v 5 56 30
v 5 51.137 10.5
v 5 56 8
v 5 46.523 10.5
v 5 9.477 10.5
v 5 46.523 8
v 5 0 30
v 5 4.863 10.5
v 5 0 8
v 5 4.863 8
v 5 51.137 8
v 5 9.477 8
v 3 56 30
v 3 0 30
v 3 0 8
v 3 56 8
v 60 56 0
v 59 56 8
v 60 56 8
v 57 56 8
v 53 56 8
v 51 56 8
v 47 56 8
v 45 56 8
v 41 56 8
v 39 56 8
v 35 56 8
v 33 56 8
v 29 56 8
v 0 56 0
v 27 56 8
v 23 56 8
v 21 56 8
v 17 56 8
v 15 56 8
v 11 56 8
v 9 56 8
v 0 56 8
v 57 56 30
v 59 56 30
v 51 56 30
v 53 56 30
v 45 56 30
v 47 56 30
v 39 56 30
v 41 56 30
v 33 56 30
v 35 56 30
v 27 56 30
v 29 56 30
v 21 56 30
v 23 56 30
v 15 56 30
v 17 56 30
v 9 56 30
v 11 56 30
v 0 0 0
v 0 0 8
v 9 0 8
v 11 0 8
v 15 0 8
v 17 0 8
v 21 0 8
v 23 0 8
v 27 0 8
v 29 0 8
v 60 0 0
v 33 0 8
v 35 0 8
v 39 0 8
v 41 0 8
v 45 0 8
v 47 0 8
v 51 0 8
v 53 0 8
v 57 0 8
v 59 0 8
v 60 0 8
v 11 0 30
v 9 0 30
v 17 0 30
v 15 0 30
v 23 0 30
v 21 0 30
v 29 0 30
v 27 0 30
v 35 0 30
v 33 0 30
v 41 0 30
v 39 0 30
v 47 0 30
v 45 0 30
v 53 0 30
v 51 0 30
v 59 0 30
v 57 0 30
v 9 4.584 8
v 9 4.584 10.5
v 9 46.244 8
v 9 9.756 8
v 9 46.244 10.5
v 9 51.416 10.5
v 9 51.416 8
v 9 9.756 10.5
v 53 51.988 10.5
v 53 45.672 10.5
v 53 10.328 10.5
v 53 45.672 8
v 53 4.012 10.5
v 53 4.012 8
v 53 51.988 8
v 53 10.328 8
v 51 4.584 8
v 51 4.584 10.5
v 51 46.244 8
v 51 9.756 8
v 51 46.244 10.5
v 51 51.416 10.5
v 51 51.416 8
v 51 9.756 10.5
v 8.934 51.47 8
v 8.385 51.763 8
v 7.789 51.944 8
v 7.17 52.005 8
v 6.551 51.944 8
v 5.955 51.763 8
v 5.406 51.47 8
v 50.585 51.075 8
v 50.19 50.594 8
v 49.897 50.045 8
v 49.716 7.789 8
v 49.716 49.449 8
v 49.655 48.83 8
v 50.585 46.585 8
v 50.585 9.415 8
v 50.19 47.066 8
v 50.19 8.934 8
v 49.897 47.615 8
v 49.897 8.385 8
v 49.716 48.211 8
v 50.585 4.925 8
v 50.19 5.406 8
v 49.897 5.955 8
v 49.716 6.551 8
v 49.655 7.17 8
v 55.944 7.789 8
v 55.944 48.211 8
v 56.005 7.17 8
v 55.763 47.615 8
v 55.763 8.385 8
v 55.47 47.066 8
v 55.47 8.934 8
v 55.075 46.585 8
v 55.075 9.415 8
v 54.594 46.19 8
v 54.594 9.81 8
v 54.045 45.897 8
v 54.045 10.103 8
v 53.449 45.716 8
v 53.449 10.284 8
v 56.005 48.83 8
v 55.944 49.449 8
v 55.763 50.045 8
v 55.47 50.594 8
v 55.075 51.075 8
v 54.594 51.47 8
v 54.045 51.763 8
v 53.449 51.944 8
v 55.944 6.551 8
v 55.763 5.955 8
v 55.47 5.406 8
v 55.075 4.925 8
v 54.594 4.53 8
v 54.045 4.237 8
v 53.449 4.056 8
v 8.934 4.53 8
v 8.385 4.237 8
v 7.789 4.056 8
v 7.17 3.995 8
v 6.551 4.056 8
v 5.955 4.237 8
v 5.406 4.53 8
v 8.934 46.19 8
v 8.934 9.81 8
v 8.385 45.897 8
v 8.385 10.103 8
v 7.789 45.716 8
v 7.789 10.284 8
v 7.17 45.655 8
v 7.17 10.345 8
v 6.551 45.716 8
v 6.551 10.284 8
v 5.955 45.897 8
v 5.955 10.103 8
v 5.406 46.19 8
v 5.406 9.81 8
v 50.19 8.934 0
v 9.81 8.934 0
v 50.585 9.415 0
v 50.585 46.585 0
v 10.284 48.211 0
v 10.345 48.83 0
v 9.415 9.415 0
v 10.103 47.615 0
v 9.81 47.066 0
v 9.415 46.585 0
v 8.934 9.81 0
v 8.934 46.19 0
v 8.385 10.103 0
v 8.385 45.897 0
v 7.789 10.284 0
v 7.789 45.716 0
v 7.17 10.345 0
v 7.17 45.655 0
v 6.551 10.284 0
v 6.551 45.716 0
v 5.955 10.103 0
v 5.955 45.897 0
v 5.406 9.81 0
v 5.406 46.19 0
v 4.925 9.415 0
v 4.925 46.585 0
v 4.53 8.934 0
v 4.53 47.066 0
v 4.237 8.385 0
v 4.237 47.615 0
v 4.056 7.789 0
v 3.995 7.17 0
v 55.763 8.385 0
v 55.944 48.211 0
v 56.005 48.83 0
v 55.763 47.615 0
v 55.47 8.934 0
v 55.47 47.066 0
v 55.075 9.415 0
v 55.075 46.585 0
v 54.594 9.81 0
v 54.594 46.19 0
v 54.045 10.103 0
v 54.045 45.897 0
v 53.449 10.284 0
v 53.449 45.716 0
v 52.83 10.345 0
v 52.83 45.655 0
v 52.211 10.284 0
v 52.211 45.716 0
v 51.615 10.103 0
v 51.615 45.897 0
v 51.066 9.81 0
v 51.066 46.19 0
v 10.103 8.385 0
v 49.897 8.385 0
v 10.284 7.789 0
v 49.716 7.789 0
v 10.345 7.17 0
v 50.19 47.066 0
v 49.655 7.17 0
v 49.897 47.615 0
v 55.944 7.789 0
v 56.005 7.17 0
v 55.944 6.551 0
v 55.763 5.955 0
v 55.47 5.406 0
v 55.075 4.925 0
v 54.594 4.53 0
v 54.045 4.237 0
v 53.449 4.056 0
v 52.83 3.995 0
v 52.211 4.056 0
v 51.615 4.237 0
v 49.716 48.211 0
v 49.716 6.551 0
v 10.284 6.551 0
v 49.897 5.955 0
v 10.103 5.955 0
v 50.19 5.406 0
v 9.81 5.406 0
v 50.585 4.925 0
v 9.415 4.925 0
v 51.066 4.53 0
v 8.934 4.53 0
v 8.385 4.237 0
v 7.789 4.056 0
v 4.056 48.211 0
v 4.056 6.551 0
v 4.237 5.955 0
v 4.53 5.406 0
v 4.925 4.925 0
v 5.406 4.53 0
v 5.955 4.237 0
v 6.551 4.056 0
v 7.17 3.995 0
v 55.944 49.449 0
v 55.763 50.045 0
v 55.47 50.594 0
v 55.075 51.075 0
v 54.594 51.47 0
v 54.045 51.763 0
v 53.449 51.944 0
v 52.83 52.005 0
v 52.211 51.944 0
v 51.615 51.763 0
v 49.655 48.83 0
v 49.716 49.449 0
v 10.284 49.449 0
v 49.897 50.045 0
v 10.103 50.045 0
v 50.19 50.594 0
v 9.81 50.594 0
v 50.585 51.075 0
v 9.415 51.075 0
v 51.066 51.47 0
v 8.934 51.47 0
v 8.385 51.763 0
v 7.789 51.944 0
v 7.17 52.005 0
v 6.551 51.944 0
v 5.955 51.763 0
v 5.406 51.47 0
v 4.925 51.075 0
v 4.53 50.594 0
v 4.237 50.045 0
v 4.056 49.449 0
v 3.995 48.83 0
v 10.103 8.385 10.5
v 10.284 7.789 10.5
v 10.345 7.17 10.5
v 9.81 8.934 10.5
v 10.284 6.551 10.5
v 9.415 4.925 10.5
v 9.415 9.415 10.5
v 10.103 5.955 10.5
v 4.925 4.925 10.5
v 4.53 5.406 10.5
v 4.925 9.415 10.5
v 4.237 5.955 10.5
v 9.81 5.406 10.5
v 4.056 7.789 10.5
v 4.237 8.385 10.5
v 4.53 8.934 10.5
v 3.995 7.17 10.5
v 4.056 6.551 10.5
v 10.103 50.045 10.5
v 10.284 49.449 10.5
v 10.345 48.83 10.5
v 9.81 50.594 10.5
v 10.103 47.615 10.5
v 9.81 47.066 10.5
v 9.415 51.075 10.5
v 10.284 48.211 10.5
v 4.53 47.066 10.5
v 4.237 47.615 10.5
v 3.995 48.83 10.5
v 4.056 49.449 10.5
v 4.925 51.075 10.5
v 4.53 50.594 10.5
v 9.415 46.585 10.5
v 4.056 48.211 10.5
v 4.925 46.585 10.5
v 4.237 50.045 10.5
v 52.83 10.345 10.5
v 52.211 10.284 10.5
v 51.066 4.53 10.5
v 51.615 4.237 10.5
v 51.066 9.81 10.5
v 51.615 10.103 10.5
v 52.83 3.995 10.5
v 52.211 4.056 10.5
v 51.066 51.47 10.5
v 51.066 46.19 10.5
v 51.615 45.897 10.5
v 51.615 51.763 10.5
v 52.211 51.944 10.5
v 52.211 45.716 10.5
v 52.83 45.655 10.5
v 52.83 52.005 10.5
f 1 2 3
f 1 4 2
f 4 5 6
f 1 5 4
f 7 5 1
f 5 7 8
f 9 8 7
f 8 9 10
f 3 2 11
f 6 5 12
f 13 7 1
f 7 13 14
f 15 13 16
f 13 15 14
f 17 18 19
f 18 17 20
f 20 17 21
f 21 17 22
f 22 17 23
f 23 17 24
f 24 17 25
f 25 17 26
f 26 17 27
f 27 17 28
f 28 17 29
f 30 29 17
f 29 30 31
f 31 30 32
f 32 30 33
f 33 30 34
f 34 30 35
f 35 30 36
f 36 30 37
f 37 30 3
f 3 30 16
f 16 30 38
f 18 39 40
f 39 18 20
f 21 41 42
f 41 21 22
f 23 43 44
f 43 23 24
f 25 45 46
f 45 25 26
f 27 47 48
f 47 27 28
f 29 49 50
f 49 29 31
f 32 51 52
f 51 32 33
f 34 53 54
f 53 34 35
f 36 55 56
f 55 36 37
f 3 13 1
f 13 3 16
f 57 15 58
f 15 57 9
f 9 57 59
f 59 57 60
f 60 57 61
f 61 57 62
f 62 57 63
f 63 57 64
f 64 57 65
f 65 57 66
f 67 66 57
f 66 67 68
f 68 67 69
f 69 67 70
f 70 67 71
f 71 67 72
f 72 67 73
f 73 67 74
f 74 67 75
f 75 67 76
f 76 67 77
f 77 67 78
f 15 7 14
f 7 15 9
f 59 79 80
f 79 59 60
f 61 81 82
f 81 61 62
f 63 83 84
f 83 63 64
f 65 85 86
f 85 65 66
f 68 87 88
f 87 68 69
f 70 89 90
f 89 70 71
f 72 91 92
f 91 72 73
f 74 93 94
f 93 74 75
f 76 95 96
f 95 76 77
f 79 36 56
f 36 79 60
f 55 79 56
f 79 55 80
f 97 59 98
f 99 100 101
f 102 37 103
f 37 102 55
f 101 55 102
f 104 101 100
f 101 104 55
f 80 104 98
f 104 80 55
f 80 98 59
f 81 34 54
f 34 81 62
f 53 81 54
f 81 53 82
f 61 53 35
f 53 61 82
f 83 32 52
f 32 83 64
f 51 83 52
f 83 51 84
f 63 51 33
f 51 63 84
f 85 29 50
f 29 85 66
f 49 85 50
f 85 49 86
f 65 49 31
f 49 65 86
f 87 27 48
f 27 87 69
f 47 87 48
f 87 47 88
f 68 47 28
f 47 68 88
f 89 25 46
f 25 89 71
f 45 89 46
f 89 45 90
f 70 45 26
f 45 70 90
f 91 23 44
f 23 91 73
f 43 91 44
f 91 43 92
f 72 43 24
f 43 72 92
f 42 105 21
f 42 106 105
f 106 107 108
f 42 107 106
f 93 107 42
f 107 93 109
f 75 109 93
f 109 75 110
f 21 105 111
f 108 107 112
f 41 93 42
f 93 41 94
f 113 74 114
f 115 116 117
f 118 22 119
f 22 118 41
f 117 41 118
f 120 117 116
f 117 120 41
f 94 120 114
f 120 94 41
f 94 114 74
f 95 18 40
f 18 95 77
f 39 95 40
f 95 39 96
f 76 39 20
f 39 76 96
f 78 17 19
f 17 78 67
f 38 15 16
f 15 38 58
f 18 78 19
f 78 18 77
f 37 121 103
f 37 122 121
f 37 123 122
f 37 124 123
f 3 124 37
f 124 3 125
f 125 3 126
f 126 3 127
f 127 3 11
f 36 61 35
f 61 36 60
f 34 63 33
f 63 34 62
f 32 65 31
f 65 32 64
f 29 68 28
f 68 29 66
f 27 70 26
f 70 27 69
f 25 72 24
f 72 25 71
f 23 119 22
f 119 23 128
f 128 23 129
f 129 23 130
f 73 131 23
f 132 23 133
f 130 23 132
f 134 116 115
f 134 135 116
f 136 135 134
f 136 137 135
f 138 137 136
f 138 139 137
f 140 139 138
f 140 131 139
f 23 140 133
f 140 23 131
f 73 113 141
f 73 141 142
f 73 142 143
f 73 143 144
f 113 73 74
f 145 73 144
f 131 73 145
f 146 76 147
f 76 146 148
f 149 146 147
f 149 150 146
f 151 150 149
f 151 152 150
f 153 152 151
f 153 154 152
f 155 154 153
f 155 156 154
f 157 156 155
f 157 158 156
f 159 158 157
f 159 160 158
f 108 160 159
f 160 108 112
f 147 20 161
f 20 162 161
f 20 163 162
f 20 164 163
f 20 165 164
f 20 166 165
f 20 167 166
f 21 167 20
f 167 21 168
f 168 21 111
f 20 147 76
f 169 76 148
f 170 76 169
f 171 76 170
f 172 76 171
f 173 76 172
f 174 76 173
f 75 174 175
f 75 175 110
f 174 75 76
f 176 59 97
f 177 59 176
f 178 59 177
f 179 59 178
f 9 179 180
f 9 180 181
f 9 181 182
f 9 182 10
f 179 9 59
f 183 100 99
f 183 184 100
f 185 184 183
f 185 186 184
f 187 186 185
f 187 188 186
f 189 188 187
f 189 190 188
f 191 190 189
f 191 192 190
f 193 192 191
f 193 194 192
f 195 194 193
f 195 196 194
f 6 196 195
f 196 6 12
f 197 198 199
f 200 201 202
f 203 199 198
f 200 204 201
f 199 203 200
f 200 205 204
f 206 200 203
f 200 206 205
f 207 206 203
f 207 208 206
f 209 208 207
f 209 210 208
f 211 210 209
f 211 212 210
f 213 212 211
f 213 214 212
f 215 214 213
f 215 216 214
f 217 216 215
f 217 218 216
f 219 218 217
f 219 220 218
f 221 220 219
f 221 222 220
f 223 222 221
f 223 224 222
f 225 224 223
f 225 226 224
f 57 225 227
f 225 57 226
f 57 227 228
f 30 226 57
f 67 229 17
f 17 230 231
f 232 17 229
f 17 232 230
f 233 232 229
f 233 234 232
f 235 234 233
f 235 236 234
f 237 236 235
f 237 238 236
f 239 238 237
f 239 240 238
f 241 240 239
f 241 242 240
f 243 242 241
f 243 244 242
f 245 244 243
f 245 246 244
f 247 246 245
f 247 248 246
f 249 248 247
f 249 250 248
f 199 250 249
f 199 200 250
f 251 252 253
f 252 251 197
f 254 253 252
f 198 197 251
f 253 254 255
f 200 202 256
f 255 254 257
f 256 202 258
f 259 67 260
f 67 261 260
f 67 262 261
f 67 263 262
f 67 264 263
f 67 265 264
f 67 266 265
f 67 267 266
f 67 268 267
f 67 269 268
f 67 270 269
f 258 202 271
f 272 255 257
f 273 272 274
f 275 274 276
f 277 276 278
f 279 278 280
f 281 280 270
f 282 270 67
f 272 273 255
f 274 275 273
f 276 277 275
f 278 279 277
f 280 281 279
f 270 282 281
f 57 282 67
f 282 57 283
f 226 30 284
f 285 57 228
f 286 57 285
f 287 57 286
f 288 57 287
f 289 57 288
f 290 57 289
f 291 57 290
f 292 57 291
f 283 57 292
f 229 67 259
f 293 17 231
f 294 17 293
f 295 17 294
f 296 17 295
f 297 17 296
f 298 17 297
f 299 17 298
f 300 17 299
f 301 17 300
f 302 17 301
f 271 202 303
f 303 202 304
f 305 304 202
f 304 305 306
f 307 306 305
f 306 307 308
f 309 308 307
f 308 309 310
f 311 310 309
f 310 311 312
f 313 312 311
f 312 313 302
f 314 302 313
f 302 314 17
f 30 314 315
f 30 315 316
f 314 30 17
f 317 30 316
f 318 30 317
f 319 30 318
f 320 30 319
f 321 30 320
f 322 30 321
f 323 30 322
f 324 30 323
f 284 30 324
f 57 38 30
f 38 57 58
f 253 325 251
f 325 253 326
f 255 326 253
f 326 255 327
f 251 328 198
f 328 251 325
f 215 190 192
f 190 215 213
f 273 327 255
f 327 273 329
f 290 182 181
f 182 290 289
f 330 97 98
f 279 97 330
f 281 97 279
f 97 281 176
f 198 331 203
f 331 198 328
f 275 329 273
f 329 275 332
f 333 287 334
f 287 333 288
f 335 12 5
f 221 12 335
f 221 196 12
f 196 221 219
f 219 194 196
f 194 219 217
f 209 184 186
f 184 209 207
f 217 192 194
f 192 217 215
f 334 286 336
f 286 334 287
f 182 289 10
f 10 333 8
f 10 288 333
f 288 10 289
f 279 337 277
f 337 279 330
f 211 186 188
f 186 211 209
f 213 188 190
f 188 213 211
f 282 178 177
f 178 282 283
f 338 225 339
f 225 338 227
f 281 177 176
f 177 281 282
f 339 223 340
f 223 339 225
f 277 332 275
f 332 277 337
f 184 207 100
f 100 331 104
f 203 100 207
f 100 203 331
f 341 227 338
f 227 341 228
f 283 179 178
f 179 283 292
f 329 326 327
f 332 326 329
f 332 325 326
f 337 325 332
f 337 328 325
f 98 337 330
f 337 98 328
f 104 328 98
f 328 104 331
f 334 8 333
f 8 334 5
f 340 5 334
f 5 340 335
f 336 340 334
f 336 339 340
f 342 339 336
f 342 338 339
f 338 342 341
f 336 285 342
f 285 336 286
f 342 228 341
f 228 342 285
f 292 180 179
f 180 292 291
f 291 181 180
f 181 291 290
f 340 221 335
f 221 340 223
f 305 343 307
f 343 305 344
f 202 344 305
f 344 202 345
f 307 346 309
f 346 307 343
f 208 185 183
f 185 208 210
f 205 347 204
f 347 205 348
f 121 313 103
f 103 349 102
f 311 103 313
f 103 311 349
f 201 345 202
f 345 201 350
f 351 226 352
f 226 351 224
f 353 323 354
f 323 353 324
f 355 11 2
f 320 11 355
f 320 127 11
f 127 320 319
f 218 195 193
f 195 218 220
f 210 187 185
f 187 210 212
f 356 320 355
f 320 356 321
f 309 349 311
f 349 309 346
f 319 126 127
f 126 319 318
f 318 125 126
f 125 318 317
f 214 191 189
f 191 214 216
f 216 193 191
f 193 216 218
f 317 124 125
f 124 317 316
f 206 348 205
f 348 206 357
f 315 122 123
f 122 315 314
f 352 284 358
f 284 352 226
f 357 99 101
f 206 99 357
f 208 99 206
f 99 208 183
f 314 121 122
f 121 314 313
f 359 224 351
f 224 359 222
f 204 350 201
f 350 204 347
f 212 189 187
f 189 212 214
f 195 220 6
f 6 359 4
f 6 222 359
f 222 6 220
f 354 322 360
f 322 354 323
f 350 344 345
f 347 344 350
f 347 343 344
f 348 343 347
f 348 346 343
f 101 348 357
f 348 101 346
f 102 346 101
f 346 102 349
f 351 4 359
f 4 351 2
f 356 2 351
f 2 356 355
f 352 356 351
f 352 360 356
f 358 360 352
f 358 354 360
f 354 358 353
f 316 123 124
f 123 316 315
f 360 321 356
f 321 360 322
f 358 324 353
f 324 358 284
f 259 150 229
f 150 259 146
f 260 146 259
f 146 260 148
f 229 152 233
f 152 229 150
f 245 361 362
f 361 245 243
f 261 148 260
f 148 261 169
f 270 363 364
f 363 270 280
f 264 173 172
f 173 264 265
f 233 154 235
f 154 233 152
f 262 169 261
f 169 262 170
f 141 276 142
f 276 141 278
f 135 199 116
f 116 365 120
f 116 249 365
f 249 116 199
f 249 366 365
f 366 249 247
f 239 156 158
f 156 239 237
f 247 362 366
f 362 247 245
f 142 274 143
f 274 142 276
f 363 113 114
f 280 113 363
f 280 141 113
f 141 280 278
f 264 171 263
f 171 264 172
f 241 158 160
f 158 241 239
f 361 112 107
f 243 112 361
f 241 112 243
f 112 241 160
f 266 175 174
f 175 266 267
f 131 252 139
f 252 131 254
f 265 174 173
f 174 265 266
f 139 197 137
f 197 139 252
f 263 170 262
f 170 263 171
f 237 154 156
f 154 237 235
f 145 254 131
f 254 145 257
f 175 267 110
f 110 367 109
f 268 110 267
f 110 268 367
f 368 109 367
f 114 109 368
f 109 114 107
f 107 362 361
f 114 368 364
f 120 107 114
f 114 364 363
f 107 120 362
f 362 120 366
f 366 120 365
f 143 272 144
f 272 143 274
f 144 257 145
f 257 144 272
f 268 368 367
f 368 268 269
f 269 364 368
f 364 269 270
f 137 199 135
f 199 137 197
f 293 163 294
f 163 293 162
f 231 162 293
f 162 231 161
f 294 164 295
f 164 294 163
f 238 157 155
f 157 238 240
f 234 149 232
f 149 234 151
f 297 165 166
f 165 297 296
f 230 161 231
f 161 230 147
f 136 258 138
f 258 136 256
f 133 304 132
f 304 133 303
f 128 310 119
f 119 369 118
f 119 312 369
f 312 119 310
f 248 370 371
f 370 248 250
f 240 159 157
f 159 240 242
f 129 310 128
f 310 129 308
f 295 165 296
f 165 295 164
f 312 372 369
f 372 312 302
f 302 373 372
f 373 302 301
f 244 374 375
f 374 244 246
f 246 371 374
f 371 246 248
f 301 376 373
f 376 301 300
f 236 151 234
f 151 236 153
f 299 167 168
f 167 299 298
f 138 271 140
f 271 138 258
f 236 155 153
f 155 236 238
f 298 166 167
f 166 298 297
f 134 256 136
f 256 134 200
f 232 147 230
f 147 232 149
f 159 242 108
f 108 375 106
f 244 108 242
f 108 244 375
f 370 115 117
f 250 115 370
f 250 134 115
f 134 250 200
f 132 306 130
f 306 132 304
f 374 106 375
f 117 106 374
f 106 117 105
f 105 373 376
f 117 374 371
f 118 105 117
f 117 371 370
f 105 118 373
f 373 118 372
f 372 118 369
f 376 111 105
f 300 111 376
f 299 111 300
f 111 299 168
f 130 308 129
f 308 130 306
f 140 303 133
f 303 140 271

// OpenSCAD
$fn = 32;

// ----------------------------------------------------------------------
// Finned heat sink: 60 x 56 mm base, 22 mm fins
// ----------------------------------------------------------------------

// --- parameters (mm) ---
base_w = 60;              // base width
base_d = 56;              // base depth
base_t = 8;               // base thickness
fin_h = 22;               // fin height above the base
holes_d = 6.35;           // fixing holes
hole_x = 22.83;           // hole offset in x
hole_y = 20.83;           // hole offset in y
fin_t = 2;                // fin thickness
fin_pitch = 6;            // fin pitch
fin_count = 10;           // number of fins
fin_x0 = 3;               // first fin offset

difference() {
  union() {
    cube([base_w, base_d, base_t]);
    for (i = [0 : fin_count - 1]) {
      translate([fin_x0 + i * fin_pitch, 0, base_t - 0.5]) cube([fin_t, base_d, fin_h + 0.5]);
    }
  }
  /* fixing holes through the base, 2.5 mm clear on both sides */
  for (hx = [-22.83, 22.83]) {
    for (hy = [-20.83, 20.83]) {
      translate([base_w / 2 + hx, base_d / 2 + hy, -2.5]) cylinder(h = base_t + 5, d = holes_d);
    }
  }
}
